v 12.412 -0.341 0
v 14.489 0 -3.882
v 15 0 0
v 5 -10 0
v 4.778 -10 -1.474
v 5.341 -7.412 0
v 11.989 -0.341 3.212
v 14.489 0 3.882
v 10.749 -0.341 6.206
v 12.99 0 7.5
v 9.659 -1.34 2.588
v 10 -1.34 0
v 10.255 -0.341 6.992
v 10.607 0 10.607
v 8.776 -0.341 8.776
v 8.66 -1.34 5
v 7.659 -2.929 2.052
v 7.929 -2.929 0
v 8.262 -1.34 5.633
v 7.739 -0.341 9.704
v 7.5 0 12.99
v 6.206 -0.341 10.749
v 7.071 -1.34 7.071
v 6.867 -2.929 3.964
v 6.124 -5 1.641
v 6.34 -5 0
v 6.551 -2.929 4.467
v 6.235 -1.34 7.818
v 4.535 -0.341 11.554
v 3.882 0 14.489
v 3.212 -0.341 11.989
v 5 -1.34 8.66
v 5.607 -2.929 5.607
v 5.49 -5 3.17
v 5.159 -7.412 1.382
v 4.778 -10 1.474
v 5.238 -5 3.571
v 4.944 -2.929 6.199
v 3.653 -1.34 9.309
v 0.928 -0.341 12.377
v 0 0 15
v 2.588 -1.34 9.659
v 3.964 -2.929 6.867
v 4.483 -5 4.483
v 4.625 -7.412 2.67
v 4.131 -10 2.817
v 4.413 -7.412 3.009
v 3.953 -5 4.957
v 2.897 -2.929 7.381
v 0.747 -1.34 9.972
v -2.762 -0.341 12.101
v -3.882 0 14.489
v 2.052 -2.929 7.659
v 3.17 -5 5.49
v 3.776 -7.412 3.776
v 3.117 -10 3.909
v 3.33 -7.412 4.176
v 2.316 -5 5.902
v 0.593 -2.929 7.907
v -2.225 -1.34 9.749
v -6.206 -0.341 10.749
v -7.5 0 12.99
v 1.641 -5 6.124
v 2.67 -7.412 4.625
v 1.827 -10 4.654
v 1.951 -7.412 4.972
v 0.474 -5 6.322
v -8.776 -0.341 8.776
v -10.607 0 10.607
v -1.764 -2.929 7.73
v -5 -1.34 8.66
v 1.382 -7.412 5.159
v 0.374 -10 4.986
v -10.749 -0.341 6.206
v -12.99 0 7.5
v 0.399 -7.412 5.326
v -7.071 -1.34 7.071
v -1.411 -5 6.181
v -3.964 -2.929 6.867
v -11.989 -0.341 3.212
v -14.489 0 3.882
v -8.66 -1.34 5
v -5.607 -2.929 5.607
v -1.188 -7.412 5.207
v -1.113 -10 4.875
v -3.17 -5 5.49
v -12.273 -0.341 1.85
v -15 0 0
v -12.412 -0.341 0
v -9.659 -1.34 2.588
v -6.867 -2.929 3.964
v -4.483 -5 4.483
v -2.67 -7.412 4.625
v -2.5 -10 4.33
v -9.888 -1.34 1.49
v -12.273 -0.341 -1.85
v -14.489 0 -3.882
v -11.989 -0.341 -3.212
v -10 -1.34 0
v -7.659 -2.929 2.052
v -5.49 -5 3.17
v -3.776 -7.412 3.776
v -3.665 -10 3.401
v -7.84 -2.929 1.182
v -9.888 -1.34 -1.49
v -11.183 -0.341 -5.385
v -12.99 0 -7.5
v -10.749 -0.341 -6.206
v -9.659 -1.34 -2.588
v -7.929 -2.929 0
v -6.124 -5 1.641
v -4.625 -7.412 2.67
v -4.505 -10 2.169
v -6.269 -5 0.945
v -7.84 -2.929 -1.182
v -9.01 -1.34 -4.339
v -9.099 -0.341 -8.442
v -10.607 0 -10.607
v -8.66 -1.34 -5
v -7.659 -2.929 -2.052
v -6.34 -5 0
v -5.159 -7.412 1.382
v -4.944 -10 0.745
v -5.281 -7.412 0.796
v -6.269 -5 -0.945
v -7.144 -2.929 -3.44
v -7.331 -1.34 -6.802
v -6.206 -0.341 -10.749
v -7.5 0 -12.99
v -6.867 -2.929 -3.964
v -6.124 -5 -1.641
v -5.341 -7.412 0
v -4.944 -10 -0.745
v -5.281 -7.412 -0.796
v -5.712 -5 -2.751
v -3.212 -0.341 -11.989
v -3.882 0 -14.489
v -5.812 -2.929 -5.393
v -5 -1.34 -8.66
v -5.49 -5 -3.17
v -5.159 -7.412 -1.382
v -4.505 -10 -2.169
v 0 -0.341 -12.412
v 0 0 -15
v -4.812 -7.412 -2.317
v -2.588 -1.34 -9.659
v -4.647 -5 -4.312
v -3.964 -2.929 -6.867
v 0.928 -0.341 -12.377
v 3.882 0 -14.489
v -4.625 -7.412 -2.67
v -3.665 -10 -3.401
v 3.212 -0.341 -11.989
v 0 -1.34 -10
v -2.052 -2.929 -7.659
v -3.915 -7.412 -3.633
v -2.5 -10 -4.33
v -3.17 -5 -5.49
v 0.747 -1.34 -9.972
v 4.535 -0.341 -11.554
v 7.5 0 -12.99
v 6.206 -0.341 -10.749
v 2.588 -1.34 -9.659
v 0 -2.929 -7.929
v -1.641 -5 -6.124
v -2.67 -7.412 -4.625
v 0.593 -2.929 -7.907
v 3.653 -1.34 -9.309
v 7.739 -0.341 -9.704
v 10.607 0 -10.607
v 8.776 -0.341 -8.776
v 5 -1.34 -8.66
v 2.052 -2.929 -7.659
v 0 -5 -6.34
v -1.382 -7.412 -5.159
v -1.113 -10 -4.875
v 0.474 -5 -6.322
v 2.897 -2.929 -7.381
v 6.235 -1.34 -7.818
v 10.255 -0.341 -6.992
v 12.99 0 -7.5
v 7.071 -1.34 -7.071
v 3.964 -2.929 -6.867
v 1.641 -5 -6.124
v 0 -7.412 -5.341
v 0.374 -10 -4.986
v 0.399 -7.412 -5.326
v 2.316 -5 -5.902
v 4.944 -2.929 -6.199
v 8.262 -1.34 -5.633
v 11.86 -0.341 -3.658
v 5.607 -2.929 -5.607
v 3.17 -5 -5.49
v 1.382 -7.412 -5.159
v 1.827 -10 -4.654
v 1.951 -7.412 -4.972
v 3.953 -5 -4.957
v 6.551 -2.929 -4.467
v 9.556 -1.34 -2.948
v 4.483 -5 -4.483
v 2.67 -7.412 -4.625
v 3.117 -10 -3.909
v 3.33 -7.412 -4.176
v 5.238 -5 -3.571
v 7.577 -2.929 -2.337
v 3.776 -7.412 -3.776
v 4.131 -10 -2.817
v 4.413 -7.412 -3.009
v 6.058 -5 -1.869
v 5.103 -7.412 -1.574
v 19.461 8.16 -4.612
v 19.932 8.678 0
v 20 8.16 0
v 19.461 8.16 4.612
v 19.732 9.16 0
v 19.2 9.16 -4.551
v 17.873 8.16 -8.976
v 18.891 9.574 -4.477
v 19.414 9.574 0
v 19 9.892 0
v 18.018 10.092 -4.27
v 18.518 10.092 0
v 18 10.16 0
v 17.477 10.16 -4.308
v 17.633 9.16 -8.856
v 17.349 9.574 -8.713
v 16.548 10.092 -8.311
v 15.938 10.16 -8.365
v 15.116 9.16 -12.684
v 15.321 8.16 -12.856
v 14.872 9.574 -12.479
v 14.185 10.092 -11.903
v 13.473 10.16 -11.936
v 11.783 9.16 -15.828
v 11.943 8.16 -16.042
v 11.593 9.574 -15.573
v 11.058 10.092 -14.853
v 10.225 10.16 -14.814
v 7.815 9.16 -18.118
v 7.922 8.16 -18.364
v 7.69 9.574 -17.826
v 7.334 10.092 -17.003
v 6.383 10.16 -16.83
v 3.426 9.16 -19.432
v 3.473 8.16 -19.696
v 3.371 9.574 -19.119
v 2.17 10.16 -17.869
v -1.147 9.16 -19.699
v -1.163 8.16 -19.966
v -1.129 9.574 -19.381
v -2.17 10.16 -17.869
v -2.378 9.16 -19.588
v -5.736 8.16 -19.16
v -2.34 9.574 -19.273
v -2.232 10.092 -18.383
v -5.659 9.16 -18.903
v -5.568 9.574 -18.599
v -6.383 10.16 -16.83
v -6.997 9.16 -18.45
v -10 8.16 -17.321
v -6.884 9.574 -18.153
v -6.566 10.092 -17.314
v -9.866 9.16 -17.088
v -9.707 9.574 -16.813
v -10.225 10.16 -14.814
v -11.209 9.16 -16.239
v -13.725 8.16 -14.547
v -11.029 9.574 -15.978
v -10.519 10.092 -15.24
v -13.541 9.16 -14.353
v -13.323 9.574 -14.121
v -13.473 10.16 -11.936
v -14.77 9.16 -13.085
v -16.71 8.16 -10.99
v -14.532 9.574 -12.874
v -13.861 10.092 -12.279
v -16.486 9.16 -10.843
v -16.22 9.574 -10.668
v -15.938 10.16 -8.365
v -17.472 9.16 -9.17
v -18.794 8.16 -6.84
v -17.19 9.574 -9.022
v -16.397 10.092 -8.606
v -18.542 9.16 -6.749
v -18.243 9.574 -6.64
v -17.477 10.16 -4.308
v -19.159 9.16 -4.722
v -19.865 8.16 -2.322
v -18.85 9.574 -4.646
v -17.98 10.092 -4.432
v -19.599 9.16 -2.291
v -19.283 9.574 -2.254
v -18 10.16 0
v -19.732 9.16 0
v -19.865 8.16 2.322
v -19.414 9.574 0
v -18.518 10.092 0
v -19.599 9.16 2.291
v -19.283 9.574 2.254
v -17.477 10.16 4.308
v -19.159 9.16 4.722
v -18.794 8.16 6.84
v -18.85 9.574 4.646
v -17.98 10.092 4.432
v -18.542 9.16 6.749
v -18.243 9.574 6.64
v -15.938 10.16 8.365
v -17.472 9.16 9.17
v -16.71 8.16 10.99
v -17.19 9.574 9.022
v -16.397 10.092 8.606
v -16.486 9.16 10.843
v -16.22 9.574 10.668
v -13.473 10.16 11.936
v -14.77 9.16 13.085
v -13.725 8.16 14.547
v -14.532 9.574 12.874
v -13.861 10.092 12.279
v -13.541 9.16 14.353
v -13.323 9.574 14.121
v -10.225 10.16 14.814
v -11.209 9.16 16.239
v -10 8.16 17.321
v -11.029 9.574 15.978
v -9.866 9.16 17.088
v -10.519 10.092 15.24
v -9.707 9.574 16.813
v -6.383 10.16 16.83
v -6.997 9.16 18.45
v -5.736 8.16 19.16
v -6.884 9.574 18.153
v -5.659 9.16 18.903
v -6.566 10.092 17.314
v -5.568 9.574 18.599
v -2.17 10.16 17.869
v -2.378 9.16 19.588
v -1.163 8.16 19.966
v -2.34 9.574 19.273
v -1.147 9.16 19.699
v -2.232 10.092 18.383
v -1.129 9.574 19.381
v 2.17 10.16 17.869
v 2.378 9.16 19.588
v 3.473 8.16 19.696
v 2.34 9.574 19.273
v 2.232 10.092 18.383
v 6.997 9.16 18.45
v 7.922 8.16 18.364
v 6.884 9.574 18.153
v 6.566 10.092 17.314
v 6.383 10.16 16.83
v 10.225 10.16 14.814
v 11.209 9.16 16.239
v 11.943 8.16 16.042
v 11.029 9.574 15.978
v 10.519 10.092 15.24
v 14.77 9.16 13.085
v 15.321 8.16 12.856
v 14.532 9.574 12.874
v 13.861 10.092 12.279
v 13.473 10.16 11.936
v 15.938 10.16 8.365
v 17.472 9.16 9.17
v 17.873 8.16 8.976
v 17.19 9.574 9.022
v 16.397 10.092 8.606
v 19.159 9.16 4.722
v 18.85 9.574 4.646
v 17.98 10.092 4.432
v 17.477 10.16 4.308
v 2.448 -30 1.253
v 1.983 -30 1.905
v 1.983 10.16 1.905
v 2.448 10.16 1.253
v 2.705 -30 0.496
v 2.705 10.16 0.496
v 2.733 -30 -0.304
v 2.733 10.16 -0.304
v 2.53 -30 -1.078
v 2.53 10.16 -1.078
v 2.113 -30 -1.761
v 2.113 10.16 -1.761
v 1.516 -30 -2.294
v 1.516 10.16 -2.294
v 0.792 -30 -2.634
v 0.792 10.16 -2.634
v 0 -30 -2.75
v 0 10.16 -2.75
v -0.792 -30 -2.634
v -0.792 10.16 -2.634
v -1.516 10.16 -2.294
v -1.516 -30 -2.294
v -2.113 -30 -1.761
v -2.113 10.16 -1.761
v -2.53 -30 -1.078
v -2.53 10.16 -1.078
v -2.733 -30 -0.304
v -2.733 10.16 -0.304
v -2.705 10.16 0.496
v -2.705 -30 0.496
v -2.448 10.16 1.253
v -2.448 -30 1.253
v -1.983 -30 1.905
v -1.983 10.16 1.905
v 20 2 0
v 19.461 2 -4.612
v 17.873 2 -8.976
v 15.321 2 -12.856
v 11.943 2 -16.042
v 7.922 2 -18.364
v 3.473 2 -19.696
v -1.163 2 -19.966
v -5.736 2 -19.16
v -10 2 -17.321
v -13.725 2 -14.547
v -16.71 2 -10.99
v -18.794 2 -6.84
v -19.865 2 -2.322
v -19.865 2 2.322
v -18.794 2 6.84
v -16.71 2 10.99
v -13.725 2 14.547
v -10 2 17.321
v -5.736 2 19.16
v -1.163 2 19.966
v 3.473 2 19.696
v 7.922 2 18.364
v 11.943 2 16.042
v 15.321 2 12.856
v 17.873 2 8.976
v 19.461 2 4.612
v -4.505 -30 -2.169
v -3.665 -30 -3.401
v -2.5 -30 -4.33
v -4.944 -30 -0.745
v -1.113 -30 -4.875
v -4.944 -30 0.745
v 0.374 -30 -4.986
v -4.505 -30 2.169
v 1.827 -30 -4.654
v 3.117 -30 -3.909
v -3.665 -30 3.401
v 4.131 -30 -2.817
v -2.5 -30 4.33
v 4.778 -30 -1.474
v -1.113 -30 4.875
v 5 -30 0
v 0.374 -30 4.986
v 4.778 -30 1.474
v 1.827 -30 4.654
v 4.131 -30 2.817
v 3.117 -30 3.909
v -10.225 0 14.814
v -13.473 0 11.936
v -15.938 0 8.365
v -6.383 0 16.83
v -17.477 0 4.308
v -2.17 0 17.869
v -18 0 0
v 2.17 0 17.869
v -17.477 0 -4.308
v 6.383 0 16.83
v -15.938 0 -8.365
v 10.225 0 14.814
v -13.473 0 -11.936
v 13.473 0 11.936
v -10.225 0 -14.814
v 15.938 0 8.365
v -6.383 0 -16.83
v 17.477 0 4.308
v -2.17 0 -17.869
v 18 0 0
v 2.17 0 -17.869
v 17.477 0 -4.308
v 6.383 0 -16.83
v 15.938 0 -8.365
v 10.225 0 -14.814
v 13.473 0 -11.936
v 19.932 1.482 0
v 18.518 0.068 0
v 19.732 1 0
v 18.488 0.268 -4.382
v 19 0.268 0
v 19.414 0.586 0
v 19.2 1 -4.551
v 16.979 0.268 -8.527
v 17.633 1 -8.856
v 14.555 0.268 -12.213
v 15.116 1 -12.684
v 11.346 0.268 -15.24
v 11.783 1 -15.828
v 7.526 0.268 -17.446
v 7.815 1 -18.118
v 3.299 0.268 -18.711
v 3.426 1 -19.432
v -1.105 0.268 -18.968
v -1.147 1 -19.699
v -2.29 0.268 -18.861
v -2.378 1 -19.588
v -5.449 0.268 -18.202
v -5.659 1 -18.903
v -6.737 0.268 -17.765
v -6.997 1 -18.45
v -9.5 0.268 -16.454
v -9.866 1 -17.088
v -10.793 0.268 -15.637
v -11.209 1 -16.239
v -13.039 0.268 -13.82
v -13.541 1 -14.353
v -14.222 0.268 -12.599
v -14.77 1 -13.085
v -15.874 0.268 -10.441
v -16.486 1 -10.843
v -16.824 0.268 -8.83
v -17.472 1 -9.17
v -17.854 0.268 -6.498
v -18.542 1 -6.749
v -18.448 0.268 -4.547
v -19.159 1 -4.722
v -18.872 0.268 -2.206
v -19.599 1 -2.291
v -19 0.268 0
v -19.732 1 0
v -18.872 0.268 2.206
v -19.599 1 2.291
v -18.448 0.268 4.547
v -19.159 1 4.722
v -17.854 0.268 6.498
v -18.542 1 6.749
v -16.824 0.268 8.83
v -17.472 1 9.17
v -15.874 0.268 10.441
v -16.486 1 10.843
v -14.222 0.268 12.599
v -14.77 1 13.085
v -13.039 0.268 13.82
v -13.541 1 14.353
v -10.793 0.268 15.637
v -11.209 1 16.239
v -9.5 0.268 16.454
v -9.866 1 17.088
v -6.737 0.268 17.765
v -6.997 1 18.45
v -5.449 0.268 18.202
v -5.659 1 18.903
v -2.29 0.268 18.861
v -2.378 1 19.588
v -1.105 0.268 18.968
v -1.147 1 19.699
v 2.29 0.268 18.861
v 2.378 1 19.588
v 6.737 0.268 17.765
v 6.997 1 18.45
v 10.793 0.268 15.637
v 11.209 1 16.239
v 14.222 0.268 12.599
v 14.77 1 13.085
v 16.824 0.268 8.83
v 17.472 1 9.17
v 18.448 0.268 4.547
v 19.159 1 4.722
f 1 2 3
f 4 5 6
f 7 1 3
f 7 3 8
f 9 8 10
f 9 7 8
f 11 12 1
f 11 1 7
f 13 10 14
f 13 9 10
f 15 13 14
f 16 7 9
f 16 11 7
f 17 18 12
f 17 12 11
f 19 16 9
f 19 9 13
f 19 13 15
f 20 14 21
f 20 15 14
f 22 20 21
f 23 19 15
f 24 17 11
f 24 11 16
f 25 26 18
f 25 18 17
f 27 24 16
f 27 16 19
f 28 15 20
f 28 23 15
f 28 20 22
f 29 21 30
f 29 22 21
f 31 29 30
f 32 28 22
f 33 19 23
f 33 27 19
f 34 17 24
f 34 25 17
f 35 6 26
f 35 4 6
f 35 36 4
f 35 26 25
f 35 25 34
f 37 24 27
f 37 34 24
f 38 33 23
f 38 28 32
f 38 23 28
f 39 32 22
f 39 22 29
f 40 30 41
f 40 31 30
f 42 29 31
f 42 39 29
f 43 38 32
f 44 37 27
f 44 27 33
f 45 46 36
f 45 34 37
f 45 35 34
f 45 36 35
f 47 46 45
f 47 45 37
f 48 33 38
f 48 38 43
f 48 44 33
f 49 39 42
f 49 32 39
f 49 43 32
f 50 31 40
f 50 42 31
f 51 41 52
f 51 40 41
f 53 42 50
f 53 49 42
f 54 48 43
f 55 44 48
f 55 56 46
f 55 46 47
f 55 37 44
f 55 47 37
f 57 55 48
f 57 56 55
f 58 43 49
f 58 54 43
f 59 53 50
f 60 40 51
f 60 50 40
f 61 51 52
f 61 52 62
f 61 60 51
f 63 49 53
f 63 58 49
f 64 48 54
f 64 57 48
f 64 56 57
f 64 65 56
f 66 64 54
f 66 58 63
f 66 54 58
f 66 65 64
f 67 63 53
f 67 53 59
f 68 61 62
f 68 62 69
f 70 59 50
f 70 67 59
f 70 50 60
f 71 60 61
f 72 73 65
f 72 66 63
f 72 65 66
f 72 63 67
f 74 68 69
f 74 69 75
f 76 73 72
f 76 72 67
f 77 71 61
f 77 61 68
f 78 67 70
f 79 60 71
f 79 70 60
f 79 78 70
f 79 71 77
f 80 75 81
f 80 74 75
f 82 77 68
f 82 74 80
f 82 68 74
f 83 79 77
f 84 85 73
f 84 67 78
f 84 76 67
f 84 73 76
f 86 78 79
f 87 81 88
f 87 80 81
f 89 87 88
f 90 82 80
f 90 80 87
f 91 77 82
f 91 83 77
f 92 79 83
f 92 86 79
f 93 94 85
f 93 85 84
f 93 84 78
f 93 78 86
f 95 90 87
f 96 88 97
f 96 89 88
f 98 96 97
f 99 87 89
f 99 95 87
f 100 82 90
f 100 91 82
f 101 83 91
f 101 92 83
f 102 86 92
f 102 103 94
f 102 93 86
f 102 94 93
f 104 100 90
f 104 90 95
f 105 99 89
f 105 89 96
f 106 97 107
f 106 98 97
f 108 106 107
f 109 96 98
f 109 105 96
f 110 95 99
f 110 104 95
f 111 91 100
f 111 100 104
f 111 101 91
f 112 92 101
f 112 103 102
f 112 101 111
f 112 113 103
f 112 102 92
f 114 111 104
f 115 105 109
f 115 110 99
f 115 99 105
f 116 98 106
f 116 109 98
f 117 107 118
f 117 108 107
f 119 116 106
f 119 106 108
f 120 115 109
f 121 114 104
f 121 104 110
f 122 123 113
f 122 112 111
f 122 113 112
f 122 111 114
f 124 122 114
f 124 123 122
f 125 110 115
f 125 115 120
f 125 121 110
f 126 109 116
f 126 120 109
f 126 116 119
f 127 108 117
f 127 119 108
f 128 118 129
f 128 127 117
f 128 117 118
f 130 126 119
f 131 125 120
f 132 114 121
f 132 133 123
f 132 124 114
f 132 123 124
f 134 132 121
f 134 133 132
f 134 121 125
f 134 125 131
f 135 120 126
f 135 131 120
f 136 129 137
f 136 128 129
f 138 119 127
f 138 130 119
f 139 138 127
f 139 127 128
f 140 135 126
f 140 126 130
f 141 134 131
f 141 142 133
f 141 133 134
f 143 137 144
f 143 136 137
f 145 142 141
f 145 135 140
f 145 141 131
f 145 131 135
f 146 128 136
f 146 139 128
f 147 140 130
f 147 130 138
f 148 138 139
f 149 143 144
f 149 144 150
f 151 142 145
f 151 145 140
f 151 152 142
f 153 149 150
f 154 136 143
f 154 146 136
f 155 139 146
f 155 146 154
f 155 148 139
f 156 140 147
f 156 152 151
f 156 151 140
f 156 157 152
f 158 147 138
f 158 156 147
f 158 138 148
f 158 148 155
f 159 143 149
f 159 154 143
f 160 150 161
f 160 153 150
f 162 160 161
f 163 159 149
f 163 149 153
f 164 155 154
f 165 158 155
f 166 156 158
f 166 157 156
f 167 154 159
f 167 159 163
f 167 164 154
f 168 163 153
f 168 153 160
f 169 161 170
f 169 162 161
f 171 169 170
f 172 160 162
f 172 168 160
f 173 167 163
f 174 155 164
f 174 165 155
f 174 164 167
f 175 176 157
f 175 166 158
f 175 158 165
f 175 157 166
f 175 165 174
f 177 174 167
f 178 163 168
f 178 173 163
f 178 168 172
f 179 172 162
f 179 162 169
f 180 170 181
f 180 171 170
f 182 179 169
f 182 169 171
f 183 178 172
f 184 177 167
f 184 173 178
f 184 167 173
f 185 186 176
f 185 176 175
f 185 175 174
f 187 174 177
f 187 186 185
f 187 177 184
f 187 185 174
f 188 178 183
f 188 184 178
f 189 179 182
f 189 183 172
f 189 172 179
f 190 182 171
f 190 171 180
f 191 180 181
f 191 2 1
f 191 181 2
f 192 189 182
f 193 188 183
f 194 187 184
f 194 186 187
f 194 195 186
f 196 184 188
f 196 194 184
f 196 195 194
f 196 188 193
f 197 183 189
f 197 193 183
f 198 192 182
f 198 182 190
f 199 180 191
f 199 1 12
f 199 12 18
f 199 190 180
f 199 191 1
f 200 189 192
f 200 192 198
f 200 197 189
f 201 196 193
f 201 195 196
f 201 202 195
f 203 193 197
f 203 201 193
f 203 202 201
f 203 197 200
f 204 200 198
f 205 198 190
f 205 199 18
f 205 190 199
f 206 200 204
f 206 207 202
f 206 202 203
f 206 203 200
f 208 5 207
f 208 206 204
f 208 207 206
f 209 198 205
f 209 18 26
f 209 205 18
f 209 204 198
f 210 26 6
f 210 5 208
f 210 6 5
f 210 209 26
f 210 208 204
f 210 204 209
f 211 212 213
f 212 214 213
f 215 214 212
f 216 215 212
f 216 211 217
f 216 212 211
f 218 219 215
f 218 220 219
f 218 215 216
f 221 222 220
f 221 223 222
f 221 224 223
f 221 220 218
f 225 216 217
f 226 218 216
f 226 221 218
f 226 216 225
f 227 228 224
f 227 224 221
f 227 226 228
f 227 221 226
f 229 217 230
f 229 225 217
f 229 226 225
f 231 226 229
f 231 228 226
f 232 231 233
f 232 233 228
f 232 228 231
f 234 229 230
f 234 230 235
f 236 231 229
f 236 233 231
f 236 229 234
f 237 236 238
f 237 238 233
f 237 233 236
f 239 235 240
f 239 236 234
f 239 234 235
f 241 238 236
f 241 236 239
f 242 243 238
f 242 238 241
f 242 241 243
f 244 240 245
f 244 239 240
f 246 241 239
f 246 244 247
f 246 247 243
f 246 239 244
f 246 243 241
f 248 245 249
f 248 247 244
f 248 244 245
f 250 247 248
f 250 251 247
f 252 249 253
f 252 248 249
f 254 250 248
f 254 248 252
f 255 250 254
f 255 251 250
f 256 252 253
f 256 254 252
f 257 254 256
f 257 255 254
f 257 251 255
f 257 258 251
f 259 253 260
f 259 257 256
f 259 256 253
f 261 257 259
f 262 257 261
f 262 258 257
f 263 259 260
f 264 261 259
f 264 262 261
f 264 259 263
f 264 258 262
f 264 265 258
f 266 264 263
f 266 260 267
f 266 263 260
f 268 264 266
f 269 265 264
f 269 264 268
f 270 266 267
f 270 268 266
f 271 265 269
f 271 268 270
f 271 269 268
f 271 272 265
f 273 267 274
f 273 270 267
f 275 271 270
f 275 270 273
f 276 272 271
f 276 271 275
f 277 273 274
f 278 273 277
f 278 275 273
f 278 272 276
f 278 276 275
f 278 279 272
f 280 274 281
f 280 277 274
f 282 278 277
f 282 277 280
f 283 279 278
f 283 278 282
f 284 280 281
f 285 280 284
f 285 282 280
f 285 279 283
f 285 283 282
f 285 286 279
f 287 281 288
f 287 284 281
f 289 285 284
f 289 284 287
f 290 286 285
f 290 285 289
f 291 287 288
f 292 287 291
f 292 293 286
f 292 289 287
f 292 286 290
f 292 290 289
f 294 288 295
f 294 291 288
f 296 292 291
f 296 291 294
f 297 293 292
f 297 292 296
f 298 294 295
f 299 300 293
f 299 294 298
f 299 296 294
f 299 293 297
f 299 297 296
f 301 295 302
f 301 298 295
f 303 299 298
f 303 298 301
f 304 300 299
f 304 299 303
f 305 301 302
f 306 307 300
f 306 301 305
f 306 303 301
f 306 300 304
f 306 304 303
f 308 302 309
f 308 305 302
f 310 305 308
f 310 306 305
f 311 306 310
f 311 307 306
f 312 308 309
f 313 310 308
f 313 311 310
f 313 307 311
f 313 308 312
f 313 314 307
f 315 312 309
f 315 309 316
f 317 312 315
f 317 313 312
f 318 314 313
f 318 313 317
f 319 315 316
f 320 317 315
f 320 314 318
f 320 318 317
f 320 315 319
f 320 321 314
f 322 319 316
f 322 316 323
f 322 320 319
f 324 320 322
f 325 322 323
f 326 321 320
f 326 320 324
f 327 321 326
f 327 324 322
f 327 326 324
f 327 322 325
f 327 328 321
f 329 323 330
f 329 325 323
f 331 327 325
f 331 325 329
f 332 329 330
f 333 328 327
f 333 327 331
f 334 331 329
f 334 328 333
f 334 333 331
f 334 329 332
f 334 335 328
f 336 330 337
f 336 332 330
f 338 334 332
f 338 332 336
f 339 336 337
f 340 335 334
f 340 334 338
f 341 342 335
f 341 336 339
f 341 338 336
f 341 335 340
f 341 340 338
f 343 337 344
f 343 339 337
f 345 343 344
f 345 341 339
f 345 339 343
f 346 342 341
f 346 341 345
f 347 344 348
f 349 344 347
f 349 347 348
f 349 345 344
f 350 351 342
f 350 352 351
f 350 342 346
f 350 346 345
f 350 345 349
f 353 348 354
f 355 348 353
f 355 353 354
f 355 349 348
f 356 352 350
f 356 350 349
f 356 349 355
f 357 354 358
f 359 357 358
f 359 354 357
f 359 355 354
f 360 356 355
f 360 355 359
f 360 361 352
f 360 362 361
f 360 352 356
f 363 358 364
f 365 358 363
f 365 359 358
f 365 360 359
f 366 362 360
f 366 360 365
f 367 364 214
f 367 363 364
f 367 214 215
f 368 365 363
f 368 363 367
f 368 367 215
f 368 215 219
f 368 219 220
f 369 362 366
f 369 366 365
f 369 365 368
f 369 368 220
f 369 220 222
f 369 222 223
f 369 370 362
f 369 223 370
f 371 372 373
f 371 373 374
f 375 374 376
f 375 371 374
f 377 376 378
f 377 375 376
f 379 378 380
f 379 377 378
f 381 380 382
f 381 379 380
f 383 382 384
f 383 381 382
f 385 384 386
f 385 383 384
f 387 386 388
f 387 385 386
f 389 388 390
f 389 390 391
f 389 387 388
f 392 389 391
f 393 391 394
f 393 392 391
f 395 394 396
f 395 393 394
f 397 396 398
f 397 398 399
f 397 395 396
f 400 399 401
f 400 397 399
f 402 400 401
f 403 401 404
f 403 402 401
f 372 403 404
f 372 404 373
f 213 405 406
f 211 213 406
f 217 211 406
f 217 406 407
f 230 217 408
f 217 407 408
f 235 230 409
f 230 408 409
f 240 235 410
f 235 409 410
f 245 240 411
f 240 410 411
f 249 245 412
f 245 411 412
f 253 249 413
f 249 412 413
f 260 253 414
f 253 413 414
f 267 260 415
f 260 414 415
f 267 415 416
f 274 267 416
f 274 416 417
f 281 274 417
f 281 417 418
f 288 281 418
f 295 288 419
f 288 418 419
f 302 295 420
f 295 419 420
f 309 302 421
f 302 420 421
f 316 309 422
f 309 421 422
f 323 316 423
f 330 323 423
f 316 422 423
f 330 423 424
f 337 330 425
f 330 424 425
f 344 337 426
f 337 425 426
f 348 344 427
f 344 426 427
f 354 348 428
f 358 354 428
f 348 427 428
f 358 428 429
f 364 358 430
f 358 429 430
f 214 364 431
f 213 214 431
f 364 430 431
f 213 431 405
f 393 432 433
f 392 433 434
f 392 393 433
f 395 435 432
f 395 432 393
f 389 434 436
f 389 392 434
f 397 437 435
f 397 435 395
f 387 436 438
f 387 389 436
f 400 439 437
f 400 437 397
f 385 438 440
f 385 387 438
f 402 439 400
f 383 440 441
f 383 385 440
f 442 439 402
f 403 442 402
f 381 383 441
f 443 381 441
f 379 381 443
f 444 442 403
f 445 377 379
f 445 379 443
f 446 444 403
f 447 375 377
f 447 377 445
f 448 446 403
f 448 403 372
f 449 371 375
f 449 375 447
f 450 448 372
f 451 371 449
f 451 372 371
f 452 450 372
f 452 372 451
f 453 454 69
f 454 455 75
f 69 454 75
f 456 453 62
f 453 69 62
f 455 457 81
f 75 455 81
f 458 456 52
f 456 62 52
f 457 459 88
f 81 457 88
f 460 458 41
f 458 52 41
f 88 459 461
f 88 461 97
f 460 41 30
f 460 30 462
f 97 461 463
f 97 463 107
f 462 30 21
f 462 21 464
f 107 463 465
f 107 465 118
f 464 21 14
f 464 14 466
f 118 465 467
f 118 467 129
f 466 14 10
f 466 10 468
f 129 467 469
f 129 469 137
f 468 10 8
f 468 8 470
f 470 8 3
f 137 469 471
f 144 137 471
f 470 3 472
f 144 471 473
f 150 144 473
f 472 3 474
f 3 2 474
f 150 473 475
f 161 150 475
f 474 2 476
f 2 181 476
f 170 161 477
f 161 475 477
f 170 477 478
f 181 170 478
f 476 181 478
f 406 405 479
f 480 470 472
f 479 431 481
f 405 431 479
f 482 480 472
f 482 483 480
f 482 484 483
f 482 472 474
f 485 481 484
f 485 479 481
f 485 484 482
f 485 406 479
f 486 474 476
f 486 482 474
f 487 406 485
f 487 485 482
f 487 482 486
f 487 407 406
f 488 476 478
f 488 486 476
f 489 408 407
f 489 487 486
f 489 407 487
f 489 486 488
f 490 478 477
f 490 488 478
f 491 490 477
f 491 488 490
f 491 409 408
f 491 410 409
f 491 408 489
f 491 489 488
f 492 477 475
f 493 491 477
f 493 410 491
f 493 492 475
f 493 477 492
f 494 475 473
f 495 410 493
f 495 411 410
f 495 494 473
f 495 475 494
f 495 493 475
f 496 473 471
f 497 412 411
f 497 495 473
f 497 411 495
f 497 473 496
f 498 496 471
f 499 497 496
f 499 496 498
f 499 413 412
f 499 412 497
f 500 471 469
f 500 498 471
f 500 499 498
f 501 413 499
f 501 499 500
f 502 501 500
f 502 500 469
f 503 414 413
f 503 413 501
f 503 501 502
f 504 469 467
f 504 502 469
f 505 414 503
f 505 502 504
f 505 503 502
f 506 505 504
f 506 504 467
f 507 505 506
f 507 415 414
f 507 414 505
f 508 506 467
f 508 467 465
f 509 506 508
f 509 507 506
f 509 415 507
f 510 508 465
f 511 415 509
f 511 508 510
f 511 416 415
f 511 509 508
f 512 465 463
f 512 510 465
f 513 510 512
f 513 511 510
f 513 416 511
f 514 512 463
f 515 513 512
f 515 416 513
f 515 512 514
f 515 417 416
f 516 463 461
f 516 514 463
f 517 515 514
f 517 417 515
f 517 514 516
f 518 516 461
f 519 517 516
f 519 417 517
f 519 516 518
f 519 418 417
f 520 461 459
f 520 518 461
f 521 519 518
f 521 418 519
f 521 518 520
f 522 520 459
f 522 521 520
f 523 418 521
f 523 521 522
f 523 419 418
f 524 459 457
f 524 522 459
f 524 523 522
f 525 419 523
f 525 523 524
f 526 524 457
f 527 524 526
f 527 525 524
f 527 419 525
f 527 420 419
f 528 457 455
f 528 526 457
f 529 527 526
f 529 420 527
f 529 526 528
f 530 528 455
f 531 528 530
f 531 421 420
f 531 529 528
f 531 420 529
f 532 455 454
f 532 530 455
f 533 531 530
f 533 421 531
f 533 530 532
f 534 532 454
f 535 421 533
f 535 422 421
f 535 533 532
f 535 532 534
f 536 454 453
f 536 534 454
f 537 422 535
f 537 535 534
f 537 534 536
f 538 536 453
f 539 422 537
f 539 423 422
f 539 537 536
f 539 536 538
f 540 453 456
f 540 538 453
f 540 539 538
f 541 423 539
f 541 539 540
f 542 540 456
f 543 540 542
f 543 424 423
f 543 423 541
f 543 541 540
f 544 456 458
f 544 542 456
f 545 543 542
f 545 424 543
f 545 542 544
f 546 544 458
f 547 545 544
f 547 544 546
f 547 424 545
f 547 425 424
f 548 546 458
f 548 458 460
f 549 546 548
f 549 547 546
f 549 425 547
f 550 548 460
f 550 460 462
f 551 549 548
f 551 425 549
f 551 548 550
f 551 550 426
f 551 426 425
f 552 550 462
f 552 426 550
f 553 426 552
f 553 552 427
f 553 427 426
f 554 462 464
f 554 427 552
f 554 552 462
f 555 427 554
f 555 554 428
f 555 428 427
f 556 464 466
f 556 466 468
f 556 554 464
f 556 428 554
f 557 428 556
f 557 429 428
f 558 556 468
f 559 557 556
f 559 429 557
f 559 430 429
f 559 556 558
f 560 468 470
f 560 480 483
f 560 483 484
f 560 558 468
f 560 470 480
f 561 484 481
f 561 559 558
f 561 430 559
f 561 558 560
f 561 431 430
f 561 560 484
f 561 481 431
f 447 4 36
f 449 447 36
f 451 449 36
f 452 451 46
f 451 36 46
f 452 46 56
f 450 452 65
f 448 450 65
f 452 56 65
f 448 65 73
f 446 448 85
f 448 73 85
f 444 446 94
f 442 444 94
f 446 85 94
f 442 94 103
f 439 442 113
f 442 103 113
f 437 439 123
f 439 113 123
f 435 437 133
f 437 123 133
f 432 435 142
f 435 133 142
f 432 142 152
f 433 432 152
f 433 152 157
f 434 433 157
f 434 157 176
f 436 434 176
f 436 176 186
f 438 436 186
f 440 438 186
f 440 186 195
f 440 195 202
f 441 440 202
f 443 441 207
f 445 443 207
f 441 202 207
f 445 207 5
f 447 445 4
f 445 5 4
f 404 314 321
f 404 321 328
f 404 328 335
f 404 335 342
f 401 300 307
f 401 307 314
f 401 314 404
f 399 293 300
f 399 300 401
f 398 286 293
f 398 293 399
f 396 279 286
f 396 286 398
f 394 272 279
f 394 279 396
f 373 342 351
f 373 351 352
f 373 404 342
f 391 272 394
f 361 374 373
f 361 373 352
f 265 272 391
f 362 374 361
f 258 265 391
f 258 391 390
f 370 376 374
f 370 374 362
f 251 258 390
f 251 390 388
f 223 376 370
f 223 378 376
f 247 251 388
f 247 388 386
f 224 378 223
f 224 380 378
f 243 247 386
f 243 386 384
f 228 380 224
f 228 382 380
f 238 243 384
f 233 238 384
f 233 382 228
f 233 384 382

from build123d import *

# Parameters (mm, degrees)
SKETCH1_R           = 20
BOSS_EXTRUDE1_DEPTH = 10.16
SKETCH3_R           = 5
BOSS_EXTRUDE3_DEPTH = 30
CUT_EXTRUDE1_DEPTH  = 40.16
FILLET1_R           = 10
FILLET2_R           = 2


with BuildPart() as part:
    # Sketch1 → Boss-Extrude1 (new body)
    with BuildSketch(Plane(origin=(0, 0, 0), x_dir=(1, 0, 0), z_dir=(0, 1, 0))):
        Circle(SKETCH1_R)
    extrude(amount=BOSS_EXTRUDE1_DEPTH)

    # Sketch3 → Boss-Extrude3 (add)
    with BuildSketch(Plane.XZ):
        Circle(SKETCH3_R)
    extrude(amount=BOSS_EXTRUDE3_DEPTH)

    # Sketch5 → Cut-Extrude1 (cut)
    with BuildSketch(Plane.XZ.offset(30)):
        with BuildLine():
            Line((-1.983299019, 1.905), (1.983299019, 1.905))
            ThreePointArc((1.983299019, 1.905), (0, -2.75), (-1.983299019, 1.905))
        make_face()
    extrude(amount=-CUT_EXTRUDE1_DEPTH, mode=Mode.SUBTRACT)

    # Fillet1
    fillet1_edges = [part.edges().sort_by_distance(p)[0] for p in [
        (-5, 0, 0),
    ]]
    fillet(fillet1_edges, radius=FILLET1_R)

    # Fillet2
    fillet2_edges = [part.edges().sort_by_distance(p)[0] for p in [
        (-20, 0, 0),
        (-20, 10.16, 0),
    ]]
    fillet(fillet2_edges, radius=FILLET2_R)


solid = part.part
